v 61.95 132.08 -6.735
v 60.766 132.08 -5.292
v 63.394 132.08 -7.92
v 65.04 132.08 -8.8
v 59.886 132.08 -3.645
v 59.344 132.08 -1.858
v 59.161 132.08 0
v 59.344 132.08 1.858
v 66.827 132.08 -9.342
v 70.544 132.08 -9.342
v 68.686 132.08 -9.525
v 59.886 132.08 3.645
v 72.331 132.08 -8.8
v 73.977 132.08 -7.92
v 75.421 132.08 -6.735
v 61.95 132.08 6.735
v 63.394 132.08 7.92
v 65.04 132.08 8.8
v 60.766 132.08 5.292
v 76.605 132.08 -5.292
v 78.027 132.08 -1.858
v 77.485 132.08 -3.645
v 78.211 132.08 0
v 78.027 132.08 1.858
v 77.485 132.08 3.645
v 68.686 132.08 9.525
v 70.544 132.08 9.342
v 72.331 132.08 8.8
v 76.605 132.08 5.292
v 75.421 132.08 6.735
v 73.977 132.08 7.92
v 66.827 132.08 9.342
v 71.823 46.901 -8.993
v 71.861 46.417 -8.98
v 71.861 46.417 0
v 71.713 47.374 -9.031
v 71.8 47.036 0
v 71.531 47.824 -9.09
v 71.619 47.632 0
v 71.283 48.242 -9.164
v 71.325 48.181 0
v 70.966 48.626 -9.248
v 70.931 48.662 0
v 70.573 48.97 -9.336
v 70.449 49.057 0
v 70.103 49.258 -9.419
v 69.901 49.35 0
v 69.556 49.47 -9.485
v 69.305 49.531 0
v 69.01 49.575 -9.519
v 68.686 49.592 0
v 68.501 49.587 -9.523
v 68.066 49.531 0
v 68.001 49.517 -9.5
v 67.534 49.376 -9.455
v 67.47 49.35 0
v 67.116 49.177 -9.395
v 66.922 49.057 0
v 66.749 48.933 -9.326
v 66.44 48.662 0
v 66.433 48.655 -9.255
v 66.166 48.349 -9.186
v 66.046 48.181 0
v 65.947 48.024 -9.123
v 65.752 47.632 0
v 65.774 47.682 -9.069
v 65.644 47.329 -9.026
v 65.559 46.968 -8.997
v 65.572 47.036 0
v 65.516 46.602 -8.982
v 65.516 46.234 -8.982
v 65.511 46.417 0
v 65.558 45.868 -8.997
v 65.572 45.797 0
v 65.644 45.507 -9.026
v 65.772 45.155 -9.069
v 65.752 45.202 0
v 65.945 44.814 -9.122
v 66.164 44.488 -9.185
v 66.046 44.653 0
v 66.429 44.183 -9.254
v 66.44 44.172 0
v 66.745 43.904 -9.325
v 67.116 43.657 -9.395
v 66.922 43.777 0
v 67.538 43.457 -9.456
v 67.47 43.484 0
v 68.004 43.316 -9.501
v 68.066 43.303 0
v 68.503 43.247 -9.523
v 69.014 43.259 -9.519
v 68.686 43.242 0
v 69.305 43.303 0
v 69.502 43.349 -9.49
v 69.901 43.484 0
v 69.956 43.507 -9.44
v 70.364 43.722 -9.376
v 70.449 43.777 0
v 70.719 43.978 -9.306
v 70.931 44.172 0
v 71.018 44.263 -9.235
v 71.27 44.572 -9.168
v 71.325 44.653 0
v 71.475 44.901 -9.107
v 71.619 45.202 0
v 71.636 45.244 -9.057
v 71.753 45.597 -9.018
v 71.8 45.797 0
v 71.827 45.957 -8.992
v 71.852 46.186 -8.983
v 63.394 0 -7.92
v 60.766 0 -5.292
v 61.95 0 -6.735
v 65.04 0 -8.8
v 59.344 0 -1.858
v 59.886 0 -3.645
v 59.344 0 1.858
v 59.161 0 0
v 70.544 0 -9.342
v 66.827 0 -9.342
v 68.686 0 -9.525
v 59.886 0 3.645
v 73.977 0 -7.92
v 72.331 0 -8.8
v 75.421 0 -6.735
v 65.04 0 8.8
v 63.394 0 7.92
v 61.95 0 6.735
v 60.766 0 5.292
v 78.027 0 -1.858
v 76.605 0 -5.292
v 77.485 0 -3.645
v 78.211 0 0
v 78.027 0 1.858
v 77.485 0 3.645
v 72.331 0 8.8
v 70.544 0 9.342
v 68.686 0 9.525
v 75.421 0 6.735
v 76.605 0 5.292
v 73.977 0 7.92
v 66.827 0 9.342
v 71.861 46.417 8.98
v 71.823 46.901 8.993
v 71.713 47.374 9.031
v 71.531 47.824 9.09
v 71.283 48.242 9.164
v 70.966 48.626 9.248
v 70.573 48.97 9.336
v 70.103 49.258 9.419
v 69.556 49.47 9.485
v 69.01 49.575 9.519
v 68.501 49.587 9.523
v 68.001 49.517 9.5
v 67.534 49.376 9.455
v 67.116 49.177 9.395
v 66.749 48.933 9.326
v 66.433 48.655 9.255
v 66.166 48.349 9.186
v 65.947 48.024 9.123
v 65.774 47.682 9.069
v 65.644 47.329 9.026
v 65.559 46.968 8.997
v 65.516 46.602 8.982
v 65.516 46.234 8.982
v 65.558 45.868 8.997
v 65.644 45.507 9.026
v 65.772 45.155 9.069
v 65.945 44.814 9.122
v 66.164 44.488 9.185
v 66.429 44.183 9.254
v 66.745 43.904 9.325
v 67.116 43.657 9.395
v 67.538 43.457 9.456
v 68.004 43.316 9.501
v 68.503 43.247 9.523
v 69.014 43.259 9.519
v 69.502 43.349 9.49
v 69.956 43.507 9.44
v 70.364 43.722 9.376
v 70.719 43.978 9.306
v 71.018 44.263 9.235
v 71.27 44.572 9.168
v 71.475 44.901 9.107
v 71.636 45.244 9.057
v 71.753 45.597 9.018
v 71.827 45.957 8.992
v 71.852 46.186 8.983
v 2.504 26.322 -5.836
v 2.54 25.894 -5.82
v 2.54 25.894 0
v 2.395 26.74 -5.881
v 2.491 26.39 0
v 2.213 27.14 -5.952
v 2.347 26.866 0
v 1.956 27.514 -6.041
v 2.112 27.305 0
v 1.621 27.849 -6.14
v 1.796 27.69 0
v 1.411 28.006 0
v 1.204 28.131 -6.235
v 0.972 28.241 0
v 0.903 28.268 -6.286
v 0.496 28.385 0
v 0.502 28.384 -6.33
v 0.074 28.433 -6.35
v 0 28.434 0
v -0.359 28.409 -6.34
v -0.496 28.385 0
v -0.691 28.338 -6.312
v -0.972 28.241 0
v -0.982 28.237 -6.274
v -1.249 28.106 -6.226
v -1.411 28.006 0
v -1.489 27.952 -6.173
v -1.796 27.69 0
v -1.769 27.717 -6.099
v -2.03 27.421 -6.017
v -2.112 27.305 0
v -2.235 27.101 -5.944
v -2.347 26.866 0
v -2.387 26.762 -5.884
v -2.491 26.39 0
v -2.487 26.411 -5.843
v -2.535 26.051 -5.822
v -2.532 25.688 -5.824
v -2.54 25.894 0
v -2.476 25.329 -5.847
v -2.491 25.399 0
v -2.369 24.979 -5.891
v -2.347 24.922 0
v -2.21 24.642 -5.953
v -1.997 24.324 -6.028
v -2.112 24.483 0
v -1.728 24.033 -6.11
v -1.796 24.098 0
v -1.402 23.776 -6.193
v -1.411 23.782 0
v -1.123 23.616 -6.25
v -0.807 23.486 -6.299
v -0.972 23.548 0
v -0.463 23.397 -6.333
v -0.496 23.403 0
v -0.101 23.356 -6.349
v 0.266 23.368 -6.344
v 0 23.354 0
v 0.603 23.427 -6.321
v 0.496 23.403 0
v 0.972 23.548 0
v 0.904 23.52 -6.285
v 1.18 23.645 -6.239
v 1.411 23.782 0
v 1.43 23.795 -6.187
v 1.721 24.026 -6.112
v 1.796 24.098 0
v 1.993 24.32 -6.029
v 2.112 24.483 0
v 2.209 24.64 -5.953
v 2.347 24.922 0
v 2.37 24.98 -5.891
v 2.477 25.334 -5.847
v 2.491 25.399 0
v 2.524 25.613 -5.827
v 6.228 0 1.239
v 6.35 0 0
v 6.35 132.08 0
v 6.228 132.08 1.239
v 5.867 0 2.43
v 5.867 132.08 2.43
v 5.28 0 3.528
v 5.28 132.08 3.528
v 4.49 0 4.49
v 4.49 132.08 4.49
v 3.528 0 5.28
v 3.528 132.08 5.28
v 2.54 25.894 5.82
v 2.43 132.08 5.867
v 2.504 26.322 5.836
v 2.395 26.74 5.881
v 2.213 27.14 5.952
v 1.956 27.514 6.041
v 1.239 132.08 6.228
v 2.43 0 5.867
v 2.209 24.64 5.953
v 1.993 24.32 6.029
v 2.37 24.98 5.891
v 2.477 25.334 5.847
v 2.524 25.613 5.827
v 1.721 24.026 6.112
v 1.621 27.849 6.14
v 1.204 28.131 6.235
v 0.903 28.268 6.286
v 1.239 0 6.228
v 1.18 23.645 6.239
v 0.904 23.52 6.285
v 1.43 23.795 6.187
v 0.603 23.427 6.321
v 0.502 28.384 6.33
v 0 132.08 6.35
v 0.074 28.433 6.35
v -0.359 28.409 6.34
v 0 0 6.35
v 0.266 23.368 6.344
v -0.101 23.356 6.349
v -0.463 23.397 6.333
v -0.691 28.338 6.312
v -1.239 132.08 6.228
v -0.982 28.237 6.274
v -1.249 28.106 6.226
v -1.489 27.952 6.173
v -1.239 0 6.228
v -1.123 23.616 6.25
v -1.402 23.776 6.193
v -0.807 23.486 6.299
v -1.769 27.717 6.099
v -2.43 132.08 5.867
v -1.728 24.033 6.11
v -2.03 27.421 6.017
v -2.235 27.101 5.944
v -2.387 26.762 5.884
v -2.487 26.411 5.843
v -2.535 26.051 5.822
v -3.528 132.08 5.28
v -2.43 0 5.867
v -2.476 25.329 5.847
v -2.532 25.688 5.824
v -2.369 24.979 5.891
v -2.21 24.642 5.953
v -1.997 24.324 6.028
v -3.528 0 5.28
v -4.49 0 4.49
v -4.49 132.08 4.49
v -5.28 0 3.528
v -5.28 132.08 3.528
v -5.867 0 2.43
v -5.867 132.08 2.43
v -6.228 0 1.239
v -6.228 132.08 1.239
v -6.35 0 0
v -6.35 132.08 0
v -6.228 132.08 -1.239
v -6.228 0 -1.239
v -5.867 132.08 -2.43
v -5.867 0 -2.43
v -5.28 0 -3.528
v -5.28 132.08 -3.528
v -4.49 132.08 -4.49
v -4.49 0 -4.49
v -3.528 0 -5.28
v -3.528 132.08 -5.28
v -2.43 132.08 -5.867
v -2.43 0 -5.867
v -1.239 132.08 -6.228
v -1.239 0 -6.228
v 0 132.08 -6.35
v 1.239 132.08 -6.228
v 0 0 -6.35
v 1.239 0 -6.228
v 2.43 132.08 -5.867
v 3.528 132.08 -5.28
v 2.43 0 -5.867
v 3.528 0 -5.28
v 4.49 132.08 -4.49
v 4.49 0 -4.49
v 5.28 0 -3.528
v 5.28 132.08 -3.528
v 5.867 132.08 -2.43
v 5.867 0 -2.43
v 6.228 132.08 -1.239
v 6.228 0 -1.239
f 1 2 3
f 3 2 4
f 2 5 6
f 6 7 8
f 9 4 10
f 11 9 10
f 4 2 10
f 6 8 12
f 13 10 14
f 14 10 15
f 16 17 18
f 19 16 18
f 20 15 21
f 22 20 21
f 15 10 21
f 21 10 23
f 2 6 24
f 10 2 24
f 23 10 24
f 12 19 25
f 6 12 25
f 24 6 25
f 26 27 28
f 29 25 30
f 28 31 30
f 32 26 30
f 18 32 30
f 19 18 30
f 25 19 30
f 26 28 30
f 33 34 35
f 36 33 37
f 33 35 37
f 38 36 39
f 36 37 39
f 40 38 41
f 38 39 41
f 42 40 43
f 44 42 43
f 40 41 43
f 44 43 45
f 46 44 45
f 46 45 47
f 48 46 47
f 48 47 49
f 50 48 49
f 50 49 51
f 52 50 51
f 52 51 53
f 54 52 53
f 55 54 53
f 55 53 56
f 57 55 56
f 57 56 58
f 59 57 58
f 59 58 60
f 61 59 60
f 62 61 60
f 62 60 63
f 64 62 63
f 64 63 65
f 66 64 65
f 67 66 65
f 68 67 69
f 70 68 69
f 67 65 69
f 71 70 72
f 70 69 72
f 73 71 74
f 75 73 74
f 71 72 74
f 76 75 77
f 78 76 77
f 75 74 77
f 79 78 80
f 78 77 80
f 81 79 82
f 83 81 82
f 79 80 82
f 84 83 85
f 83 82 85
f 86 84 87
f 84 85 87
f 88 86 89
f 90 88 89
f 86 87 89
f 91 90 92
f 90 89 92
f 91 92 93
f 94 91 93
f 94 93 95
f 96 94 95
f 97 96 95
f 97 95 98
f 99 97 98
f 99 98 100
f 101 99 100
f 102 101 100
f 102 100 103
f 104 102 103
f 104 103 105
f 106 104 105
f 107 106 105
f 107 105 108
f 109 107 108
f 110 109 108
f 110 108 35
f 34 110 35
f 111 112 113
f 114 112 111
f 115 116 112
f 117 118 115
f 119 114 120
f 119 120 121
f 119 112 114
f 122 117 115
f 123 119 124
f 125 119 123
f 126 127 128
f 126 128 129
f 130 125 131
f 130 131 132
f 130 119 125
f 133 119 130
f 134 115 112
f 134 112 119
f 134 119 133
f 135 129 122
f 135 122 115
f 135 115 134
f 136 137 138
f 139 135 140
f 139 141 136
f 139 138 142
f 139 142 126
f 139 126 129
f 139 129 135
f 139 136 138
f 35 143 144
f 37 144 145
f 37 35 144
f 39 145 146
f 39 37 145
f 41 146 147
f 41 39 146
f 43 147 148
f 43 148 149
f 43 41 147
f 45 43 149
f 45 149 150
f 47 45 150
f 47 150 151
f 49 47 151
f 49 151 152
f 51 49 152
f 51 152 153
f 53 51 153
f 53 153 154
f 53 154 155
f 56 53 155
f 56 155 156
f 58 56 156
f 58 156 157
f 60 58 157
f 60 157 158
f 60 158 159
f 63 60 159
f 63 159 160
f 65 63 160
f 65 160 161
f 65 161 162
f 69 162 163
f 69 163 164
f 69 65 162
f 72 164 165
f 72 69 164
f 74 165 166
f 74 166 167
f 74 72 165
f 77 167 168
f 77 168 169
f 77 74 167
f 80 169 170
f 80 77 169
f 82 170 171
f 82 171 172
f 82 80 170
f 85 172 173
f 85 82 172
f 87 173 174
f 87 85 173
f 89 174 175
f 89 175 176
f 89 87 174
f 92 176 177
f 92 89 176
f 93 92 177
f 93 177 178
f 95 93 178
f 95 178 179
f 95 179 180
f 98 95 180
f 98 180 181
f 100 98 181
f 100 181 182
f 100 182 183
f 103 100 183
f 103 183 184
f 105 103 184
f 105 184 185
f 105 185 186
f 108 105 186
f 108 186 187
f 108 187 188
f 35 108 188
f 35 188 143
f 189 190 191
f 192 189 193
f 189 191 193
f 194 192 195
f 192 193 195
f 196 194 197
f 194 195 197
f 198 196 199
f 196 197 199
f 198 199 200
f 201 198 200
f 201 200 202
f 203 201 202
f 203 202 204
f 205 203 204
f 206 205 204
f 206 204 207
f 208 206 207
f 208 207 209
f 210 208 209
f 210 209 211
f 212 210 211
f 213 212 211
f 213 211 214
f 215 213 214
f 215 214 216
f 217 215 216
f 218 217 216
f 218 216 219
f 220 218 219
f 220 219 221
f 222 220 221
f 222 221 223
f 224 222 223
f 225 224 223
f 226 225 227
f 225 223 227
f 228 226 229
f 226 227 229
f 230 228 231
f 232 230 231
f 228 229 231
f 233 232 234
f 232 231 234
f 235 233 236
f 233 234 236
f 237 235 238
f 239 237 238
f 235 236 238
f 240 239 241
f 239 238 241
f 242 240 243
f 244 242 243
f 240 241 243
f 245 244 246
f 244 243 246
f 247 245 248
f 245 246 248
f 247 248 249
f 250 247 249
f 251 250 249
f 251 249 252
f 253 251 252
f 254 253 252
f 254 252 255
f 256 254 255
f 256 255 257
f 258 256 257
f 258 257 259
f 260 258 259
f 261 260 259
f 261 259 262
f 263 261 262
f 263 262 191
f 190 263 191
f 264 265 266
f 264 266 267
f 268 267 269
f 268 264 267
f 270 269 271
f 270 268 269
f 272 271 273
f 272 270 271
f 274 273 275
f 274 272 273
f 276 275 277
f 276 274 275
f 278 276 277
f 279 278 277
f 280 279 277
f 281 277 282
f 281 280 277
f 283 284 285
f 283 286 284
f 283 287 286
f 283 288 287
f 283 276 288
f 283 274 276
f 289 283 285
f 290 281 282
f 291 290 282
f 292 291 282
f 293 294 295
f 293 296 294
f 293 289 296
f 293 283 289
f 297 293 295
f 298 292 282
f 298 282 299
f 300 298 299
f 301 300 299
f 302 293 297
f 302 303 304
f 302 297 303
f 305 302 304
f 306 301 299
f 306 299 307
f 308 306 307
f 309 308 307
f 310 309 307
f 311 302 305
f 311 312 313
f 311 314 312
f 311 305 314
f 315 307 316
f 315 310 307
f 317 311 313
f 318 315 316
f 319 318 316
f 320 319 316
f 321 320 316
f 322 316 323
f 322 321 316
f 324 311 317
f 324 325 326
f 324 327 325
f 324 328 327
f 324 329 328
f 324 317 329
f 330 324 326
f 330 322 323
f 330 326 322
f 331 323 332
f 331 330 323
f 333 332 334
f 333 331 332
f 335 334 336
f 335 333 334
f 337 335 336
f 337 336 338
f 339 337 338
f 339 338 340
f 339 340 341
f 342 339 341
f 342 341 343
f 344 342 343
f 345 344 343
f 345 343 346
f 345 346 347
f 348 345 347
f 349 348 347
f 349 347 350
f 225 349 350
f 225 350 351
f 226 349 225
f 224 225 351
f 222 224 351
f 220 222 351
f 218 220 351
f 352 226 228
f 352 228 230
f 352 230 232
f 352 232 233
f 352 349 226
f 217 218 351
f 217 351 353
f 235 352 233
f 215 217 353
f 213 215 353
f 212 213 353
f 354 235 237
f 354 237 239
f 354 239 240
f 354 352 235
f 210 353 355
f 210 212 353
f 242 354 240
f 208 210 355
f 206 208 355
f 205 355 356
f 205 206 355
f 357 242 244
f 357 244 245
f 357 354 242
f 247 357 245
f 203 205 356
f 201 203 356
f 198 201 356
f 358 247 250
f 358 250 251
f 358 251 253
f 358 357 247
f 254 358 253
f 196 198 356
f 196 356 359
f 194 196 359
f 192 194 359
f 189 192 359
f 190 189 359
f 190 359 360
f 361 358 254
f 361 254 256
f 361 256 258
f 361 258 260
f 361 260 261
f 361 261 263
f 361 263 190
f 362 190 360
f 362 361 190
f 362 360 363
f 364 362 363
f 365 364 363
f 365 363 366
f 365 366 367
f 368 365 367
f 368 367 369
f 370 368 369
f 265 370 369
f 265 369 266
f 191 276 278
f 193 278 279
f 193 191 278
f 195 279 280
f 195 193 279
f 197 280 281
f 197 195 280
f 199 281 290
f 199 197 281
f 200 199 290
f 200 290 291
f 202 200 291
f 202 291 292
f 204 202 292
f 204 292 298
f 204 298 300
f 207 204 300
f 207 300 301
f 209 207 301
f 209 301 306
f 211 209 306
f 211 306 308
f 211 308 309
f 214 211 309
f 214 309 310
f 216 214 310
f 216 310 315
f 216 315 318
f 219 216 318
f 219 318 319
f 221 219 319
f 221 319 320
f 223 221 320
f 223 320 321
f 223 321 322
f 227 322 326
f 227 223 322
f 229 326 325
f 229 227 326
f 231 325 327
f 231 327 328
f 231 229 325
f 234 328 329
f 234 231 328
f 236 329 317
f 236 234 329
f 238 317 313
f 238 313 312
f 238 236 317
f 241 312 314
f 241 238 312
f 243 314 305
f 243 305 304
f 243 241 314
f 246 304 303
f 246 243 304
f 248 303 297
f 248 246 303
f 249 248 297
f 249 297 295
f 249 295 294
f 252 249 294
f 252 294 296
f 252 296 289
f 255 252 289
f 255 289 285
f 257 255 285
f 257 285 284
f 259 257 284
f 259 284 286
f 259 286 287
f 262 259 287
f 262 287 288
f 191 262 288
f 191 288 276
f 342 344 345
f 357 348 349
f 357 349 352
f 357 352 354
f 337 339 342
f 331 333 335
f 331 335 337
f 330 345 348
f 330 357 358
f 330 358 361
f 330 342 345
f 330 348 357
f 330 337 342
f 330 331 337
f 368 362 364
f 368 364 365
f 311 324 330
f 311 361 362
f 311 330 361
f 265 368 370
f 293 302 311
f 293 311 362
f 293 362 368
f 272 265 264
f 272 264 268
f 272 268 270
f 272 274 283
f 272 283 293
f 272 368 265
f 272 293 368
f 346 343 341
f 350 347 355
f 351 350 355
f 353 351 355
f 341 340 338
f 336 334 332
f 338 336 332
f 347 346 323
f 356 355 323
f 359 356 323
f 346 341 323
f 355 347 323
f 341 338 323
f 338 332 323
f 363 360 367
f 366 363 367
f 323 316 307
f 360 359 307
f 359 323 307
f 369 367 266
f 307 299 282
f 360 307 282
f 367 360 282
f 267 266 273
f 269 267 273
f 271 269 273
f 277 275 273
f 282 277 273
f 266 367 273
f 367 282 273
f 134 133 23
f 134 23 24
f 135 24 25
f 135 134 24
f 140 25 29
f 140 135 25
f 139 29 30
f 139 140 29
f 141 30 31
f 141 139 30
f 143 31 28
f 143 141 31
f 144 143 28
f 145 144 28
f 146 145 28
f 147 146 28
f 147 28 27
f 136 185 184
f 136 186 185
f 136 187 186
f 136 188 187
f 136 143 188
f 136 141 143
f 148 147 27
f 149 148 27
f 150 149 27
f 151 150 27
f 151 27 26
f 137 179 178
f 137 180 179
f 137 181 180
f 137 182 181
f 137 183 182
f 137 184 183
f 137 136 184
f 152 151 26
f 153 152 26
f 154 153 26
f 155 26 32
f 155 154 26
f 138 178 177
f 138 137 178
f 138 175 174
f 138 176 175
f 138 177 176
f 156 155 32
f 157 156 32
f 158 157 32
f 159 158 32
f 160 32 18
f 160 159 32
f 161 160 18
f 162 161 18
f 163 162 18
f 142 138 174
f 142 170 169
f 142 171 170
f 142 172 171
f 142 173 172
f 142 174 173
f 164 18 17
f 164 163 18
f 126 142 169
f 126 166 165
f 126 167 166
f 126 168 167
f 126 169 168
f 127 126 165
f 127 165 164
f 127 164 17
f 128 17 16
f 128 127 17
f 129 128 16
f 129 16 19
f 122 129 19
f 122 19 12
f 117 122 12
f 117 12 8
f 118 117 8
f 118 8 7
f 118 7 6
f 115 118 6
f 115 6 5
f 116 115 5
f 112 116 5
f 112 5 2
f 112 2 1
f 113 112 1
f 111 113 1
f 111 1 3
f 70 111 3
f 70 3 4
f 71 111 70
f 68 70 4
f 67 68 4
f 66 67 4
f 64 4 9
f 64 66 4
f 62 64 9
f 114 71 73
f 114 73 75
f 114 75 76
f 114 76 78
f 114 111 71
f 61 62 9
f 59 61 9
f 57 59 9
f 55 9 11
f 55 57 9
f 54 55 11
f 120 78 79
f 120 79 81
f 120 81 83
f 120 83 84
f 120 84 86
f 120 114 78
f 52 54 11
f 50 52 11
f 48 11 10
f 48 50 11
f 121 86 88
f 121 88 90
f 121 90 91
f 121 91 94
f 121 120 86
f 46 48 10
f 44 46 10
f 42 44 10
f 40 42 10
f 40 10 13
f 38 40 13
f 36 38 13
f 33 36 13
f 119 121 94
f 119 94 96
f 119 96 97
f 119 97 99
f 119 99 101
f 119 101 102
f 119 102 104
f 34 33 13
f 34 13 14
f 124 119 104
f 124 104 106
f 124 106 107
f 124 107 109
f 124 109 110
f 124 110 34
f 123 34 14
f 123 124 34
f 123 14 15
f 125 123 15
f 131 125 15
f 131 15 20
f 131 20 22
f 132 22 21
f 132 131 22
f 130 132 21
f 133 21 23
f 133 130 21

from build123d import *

# Parameters (mm, degrees)
F0_R          = 6.35
F1_DEPTH      = 132.08
F0_R_2        = 9.525
F2_R          = 2.54
F2_R_2        = 3.175
F3_DEPTH      = 9.526
F3_DEPTH_BACK = 9.526


with BuildPart() as f1:
    # F0 (on Front) → F1 (new body)
    with BuildSketch(Plane.XZ):
        Circle(F0_R)
    extrude(amount=-F1_DEPTH)


with BuildPart() as f1b:
    # F0 (on Front) → F1, piece 2 (new body)
    with BuildSketch(Plane.XZ):
        with Locations((68.685516715, 0)):
            Circle(F0_R_2)
    extrude(amount=-F1_DEPTH)


with BuildPart() as f3_tool:
    # F2 (on Top) → F3 (new body, two sides)
    with BuildSketch(Plane.XY) as f3_sk:
        with Locations((0, 25.8942256683)):
            Circle(F2_R)
        with Locations((68.685516715, 46.4168787003)):
            Circle(F2_R_2)
    extrude(amount=-F3_DEPTH)
    extrude(f3_sk.sketch, amount=F3_DEPTH_BACK)


with BuildPart() as f1_1:
    add(f1.part)

    # F3: cut by f3_tool
    add(f3_tool.part, mode=Mode.SUBTRACT)


with BuildPart() as f1b_1:
    add(f1b.part)

    # F3: cut by f3_tool
    add(f3_tool.part, mode=Mode.SUBTRACT)


solid = Compound([f1_1.part, f1b_1.part])
